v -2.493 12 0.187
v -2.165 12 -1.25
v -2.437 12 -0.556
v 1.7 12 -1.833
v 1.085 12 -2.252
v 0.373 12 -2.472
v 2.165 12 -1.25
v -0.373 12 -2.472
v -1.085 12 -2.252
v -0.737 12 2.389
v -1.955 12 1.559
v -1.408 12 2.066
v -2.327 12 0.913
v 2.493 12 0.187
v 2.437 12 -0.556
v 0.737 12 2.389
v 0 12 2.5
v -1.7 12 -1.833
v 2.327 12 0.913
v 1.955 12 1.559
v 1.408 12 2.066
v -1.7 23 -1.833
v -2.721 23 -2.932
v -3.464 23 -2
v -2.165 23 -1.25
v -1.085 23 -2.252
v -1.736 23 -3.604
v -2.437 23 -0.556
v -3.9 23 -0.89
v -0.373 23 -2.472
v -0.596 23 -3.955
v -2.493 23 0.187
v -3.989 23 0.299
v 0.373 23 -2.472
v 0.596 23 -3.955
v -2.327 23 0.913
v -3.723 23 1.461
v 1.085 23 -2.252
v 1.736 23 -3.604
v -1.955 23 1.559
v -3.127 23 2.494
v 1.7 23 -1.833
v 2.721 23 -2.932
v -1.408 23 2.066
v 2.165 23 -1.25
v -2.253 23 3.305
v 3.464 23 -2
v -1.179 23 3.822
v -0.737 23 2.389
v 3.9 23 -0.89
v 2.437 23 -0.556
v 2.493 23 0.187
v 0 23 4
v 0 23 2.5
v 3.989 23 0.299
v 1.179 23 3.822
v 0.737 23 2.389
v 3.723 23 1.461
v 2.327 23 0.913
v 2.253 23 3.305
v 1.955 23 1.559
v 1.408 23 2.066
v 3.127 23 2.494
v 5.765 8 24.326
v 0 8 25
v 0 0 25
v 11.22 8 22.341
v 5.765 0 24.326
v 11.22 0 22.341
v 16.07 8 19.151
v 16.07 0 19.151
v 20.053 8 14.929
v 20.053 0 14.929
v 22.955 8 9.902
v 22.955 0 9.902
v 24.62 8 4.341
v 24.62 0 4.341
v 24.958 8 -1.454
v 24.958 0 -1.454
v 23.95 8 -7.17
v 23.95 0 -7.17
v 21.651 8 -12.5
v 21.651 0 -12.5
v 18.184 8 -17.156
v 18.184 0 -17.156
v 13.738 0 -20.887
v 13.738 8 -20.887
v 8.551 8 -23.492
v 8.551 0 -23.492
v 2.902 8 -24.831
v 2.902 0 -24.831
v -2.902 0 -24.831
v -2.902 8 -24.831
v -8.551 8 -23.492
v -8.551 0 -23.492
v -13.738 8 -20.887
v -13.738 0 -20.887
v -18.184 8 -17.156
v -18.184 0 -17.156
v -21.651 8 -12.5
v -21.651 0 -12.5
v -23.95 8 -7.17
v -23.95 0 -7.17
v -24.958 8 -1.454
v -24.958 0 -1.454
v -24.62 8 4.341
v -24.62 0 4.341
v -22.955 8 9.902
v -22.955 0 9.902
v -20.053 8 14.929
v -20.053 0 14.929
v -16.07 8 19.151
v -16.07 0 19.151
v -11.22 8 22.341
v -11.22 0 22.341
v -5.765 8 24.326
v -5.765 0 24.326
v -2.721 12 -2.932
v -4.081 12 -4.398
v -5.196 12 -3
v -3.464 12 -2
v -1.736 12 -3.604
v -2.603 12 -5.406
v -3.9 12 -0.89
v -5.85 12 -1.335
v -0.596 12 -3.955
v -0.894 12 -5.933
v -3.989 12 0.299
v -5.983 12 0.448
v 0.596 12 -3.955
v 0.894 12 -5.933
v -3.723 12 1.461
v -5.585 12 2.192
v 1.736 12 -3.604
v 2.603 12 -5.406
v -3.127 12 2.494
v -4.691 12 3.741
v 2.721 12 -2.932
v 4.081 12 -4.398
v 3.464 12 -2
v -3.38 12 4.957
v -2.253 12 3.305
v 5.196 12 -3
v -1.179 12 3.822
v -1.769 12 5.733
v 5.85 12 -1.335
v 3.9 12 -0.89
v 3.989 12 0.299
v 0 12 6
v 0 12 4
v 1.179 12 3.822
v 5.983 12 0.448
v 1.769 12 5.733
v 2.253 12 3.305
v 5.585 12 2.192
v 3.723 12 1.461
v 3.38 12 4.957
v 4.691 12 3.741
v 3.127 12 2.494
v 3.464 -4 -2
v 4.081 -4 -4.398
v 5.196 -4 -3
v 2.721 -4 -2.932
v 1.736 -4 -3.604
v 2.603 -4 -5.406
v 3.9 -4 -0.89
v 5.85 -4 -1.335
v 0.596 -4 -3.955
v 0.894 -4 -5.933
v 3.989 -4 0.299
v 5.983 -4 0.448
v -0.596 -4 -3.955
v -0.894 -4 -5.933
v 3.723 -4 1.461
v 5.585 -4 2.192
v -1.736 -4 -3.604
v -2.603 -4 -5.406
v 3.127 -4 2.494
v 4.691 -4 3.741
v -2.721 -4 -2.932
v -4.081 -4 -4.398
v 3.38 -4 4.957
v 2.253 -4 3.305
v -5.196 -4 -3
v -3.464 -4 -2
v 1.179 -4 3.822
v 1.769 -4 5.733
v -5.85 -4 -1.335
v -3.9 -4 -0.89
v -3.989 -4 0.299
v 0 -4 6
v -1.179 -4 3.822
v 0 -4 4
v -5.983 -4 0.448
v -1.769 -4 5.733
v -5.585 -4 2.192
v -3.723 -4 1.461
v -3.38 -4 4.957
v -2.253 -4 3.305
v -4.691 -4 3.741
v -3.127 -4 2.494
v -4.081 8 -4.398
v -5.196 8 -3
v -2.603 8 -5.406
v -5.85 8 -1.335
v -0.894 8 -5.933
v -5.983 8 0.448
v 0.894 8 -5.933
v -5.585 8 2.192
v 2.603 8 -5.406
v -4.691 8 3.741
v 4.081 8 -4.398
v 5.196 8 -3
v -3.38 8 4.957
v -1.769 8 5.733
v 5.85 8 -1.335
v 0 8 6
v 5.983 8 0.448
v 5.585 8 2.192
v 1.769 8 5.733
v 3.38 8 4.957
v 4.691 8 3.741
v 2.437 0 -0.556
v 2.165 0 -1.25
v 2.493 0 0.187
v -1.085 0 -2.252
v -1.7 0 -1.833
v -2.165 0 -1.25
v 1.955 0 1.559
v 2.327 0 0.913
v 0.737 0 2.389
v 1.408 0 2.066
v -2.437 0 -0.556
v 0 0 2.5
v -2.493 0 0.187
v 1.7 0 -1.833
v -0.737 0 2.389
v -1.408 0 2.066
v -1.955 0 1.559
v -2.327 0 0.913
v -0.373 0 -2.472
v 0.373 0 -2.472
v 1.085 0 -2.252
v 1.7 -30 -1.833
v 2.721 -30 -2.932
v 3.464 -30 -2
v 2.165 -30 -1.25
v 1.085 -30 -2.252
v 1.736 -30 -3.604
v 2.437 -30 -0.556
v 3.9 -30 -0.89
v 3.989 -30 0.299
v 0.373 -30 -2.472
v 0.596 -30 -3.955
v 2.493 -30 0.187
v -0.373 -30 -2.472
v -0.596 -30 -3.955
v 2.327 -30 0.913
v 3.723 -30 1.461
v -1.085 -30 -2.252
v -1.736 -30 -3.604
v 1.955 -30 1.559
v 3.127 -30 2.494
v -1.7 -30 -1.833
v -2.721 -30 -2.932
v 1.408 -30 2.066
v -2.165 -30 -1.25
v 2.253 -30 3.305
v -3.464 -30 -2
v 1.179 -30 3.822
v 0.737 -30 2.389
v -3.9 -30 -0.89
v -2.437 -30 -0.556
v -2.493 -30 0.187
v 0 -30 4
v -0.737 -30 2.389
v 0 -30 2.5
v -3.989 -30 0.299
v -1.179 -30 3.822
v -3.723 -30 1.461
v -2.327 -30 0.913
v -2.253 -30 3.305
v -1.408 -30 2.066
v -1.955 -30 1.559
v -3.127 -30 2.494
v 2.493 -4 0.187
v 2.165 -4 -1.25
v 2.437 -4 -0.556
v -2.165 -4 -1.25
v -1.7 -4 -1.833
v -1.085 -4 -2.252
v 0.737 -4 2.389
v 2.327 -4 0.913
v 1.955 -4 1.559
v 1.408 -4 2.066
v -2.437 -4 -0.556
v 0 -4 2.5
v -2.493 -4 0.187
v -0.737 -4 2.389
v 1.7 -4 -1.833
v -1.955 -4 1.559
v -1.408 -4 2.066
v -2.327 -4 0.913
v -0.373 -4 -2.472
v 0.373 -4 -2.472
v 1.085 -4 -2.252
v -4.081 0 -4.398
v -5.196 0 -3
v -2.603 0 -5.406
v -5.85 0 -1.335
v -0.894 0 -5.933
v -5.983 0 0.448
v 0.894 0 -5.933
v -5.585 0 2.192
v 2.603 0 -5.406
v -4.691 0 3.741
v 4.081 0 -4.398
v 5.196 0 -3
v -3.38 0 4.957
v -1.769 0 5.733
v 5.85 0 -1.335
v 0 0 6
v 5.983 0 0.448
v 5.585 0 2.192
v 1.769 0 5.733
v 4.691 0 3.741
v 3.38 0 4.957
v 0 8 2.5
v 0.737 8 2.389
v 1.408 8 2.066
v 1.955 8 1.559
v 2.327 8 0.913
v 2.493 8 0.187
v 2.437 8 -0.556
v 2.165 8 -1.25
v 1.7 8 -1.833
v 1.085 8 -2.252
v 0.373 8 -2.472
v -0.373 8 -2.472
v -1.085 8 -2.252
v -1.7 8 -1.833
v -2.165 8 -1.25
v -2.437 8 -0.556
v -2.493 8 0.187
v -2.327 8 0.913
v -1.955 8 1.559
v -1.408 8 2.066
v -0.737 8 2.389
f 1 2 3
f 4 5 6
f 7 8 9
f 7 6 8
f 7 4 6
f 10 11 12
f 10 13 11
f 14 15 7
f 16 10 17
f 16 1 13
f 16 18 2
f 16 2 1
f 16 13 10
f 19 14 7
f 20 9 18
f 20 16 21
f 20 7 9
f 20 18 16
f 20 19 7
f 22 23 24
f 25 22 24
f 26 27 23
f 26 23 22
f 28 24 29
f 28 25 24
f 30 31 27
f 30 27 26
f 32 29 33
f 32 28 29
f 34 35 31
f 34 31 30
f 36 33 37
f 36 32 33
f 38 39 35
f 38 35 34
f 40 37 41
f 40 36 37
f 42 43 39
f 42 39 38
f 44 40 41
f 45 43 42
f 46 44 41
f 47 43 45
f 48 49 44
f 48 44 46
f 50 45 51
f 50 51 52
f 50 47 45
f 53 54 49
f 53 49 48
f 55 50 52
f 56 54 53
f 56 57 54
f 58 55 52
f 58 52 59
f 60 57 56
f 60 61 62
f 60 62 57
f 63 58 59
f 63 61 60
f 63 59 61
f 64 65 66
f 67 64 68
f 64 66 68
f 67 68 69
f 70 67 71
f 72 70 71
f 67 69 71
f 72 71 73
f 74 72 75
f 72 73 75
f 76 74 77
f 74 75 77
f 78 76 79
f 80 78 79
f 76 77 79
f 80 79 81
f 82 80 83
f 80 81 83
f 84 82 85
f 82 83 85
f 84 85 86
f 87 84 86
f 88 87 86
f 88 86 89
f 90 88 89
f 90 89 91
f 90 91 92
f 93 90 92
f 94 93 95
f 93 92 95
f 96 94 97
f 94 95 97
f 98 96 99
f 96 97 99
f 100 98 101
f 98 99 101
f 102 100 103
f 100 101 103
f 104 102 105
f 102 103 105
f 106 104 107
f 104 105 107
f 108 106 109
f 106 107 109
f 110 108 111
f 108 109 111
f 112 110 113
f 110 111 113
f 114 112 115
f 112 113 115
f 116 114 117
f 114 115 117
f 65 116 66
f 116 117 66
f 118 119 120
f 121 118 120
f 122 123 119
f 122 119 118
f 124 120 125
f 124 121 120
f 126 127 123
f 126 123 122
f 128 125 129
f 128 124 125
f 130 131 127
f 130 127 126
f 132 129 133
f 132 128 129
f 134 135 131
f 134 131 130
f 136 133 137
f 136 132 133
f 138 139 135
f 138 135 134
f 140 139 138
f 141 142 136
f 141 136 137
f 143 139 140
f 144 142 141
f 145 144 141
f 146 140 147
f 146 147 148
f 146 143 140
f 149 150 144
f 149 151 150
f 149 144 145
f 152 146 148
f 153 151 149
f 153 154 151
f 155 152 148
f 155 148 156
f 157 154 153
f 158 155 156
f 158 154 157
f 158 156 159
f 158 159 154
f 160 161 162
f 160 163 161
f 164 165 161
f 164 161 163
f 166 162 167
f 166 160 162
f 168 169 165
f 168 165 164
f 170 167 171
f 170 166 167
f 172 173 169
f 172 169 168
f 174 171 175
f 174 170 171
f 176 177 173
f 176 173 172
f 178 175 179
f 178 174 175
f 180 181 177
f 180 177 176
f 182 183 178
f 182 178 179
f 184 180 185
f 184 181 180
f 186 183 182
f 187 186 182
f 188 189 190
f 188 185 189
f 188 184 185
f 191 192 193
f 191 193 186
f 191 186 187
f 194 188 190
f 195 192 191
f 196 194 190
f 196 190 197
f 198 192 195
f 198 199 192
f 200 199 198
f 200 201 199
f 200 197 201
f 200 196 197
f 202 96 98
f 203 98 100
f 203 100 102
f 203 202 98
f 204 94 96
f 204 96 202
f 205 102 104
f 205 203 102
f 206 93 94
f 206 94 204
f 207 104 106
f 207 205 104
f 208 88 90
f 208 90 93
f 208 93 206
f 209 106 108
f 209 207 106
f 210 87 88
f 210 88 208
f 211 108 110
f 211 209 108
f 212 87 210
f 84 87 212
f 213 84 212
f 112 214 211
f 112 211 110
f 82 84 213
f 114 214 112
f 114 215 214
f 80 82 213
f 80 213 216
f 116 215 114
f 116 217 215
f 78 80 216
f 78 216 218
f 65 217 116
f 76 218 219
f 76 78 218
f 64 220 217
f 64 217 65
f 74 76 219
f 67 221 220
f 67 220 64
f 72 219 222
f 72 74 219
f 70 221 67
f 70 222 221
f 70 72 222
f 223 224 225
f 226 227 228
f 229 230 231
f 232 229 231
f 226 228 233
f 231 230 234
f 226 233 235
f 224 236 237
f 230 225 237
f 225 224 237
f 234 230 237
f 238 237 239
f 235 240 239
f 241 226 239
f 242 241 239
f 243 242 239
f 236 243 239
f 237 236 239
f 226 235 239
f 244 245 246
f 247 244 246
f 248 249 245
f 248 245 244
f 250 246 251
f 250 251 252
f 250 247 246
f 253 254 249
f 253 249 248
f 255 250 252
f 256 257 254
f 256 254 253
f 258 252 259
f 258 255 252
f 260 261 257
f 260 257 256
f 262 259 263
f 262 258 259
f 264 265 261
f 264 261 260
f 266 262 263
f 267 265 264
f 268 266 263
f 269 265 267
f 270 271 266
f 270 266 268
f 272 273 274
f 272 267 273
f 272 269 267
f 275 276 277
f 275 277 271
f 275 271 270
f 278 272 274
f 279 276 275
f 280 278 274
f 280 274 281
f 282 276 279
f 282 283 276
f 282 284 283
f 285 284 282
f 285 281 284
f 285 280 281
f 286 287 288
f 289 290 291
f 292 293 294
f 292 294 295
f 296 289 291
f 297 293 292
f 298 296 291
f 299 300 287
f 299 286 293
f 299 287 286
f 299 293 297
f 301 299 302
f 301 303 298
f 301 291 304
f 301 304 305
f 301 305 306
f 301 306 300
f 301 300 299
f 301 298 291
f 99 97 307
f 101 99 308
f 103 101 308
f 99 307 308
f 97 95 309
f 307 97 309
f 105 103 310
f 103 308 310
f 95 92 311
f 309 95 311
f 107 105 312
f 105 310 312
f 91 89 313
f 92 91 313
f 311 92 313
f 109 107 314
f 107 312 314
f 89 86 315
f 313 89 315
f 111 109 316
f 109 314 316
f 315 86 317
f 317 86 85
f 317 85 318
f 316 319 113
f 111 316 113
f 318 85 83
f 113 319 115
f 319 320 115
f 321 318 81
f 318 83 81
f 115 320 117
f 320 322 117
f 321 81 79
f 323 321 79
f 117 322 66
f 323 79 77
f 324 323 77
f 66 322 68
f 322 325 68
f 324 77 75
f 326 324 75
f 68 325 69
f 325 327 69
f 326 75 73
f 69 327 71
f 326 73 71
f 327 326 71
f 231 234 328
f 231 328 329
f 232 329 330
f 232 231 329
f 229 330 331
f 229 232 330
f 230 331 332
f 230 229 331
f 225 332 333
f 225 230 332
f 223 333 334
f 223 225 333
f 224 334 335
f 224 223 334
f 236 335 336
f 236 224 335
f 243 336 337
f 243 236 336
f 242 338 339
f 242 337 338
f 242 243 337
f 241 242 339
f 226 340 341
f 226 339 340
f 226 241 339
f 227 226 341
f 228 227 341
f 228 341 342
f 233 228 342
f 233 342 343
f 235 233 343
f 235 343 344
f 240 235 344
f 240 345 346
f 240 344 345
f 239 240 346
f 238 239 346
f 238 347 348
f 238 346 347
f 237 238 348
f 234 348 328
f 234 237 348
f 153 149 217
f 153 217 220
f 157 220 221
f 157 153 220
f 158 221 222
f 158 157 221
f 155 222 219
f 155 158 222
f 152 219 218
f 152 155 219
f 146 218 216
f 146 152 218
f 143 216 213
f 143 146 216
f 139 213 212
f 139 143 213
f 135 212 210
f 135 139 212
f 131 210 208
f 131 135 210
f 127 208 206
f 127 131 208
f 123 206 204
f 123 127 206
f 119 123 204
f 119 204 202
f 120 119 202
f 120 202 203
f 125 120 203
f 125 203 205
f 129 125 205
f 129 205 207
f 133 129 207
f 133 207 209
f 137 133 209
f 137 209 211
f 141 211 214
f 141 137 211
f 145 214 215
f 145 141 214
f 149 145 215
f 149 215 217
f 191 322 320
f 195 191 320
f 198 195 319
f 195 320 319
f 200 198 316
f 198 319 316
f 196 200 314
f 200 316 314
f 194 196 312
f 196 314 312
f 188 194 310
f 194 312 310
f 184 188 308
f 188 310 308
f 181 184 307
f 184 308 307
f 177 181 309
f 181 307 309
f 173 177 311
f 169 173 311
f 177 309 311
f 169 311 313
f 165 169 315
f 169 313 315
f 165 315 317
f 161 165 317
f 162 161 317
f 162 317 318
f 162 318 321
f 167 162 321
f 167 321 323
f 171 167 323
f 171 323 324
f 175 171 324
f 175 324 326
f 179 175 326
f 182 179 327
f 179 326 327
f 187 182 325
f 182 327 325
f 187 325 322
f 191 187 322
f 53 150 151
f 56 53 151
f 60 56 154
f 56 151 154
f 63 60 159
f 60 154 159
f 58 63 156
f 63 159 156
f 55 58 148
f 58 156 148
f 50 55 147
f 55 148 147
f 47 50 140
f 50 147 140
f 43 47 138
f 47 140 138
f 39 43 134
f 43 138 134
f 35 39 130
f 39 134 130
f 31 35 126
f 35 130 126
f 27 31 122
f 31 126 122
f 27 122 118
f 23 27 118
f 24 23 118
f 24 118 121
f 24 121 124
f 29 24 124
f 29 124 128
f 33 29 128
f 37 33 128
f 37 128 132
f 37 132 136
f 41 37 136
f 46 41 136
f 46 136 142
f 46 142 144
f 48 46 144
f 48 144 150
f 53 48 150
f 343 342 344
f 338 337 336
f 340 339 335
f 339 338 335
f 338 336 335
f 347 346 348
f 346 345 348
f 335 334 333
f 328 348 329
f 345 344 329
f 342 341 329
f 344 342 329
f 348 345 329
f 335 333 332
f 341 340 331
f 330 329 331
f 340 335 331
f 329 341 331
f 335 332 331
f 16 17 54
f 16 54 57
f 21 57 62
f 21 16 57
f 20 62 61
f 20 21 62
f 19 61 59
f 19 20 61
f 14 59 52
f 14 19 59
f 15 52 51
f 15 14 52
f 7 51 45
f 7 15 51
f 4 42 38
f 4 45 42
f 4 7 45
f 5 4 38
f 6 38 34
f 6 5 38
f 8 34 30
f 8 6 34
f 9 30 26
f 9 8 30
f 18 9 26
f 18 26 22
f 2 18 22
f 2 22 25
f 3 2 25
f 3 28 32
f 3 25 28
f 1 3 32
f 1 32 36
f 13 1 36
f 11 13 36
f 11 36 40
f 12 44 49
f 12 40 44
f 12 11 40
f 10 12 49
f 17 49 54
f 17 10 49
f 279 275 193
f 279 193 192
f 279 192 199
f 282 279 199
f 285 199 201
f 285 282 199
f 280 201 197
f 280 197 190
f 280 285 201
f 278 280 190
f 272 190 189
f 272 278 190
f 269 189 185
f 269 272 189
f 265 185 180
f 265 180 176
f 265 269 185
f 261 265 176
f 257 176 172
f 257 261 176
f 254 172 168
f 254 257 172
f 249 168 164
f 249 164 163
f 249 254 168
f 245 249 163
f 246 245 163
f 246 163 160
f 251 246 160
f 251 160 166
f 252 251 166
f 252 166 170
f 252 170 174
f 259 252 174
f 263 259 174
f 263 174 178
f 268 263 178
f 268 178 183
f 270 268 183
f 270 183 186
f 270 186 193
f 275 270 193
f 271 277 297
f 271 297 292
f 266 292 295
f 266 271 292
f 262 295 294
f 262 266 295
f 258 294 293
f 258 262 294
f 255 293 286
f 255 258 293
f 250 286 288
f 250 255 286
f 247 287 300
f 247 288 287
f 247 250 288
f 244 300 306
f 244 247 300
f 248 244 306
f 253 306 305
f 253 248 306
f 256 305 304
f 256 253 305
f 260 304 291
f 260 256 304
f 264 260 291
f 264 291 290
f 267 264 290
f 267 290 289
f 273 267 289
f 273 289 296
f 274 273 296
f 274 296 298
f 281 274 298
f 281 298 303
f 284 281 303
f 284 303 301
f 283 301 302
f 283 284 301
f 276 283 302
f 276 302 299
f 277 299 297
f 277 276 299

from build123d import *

# Parameters (mm, degrees)
SKETCH1_R               = 25
BOSS_EXTRUDE1_DEPTH     = 8
SKETCH2_R               = 4
BOSS_EXTRUDE2_DEPTH     = 15
BOSS_EXTRUDE3_START     = 30
SKETCH3_R               = 4
BOSS_EXTRUDE3_DEPTH     = 30
CUT_EXTRUDE1_DEPTH      = 64.710281745
CUT_EXTRUDE1_DEPTH_BACK = 64.710281745
SKETCH4_R               = 2.5
SKETCH5_R               = 6
BOSS_EXTRUDE4_DEPTH     = 4
BOSS_EXTRUDE5_START     = 4
SKETCH6_R               = 6
BOSS_EXTRUDE5_DEPTH     = 4


with BuildPart() as part:
    # Sketch1 → Boss-Extrude1 (new body)
    with BuildSketch(Plane(origin=(0, 0, 0), x_dir=(1, 0, 0), z_dir=(0, 1, 0))):
        with Locations(Location((0, 0, 0), (0, 0, 270))):
            Circle(SKETCH1_R)
    extrude(amount=BOSS_EXTRUDE1_DEPTH)

    # Sketch2 → Boss-Extrude2 (add)
    with BuildSketch(Plane(origin=(0, 8, 0), x_dir=(1, 0, 0), z_dir=(0, 1, 0))):
        with Locations(Location((0, 0, 0), (0, 0, 270))):
            Circle(SKETCH2_R)
    extrude(amount=BOSS_EXTRUDE2_DEPTH)

    # Sketch3 → Boss-Extrude3 (add)
    with BuildSketch(Plane.XZ.offset(BOSS_EXTRUDE3_START)):
        with Locations(Location((0, 0, 0), (0, 0, 90))):
            Circle(SKETCH3_R)
    extrude(amount=-BOSS_EXTRUDE3_DEPTH)

    # Sketch4 → Cut-Extrude1 (cut, two sides: drawn at the far end of the back side and taken through both)
    with BuildSketch(Plane(origin=(0, 23, 0), x_dir=(1, 0, 0), z_dir=(0, 1, 0)).offset(-CUT_EXTRUDE1_DEPTH_BACK)):
        with Locations(Location((0, 0, 0), (0, 0, 270))):
            Circle(SKETCH4_R)
    extrude(amount=CUT_EXTRUDE1_DEPTH + CUT_EXTRUDE1_DEPTH_BACK, mode=Mode.SUBTRACT)

    # Sketch5 → Boss-Extrude4 (add)
    with BuildSketch(Plane.XZ):
        with Locations(Location((0, 0, 0), (0, 0, 90))):
            Circle(SKETCH5_R)
    extrude(amount=BOSS_EXTRUDE4_DEPTH)

    # Sketch6 → Boss-Extrude5 (add)
    with BuildSketch(Plane(origin=(0, 8, 0), x_dir=(1, 0, 0), z_dir=(0, 1, 0)).offset(BOSS_EXTRUDE5_START)):
        with Locations(Location((0, 0, 0), (0, 0, 270))):
            Circle(SKETCH6_R)
    extrude(amount=-BOSS_EXTRUDE5_DEPTH)


solid = part.part
